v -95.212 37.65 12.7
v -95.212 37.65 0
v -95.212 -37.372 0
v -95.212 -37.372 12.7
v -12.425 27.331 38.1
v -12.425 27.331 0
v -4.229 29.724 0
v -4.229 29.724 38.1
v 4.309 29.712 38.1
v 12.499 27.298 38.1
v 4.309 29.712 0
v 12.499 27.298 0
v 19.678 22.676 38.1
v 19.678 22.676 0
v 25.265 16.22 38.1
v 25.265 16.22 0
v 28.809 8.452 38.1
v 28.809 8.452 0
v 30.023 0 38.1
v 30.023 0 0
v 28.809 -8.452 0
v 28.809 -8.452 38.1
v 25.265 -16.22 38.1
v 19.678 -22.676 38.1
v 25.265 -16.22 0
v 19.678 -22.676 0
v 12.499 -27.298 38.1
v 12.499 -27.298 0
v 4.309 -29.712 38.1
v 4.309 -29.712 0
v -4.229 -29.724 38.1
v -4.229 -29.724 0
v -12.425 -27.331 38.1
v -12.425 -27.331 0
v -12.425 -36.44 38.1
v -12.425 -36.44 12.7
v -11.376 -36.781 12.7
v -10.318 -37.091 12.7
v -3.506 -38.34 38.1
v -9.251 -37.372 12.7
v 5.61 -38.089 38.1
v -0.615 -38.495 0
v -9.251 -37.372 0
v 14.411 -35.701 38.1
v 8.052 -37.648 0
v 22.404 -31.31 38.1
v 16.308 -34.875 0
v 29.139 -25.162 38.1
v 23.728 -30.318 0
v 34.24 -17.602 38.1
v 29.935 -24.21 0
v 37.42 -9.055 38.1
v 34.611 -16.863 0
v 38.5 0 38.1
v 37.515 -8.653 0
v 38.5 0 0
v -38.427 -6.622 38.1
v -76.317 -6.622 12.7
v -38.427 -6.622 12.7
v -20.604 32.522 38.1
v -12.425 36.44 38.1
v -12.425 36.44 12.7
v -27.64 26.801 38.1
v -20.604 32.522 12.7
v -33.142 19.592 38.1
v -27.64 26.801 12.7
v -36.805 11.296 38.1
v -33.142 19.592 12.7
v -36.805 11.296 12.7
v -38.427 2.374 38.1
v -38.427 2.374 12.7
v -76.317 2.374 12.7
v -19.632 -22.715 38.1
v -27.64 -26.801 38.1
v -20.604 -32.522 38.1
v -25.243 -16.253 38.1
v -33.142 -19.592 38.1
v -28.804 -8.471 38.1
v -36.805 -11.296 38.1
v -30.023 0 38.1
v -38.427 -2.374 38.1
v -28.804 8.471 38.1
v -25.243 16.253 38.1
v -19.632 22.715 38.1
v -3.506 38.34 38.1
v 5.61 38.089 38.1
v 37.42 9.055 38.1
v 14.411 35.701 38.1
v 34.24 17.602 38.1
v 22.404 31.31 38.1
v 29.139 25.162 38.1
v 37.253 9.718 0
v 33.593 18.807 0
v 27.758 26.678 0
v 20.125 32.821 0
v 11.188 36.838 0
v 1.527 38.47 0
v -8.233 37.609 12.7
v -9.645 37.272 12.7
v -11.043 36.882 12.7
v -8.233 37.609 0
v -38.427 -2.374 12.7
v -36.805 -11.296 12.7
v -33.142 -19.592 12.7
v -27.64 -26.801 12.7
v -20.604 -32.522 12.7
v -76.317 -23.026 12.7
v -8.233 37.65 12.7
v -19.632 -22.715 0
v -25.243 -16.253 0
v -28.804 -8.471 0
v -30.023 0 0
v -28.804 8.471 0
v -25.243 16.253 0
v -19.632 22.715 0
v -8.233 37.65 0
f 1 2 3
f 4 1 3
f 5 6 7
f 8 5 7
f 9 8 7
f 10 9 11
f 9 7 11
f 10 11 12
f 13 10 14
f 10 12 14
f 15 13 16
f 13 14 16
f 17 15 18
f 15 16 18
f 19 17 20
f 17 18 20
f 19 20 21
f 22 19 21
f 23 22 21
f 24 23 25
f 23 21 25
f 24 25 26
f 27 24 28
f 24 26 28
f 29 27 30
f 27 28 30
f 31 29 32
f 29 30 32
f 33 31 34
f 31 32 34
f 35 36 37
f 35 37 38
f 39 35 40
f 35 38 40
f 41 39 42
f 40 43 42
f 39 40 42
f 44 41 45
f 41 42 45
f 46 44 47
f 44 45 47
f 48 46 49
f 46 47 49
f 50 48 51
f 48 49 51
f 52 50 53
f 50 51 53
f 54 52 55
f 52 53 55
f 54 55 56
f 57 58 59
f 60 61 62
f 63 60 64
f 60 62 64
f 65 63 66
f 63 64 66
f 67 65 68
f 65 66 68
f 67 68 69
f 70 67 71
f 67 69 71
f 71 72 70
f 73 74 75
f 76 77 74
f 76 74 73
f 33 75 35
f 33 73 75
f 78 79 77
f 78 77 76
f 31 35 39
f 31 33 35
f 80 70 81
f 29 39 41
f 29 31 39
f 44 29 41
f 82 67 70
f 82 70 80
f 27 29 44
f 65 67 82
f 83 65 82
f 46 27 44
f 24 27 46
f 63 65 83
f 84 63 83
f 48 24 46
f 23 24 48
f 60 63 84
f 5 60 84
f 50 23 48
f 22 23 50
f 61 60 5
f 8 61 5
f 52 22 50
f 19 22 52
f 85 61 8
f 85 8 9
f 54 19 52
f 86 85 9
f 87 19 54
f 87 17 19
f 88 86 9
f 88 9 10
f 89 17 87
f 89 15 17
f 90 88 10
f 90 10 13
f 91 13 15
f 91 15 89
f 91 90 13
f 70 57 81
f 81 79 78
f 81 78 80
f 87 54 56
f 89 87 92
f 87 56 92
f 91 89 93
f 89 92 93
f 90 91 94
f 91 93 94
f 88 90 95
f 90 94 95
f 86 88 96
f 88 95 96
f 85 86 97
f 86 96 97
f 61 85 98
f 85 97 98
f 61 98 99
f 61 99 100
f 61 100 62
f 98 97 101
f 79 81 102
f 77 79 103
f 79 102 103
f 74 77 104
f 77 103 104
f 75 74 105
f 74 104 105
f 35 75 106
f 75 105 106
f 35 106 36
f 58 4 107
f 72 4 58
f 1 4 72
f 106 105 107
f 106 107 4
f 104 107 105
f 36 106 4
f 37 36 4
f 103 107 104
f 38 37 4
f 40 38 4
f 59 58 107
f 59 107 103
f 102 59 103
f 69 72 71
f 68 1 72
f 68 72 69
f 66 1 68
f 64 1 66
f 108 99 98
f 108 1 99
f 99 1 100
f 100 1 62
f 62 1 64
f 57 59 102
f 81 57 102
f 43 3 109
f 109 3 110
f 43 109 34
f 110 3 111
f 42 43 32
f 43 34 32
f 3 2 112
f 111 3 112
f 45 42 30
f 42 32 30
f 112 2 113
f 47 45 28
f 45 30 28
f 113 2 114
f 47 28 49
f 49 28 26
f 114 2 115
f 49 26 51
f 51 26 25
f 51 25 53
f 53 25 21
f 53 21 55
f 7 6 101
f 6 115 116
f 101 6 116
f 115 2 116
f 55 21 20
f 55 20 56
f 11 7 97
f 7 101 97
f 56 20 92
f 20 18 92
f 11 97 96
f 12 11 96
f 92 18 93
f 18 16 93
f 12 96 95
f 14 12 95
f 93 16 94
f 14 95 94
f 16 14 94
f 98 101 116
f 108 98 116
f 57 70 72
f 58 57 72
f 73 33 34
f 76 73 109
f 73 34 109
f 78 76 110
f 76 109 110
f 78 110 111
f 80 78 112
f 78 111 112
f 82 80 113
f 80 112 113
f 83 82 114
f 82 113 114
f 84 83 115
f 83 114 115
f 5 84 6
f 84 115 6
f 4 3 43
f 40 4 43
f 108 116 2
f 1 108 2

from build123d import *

# Parameters (mm, degrees)
F1_DEPTH = 38.1
F3_DEPTH = 12.7
F4_W     = 37.890759
F4_H     = 8.996059
F5_DEPTH = 25.4
F7_DEPTH = 25.4


with BuildPart() as f1:
    # F0 (on Top) → F1 (new body)
    with BuildSketch(Plane.XY):
        with BuildLine():
            Line((-12.425475, 27.331422), (-12.425475, 36.439589))
            ThreePointArc((-12.425475, 36.439589), (-38.49982, 0), (-12.425475, -36.439589))
            Line((-12.425475, -36.439589), (-12.425475, -27.331422))
            ThreePointArc((-12.425475, -27.331422), (-30.023308, 0), (-12.425475, 27.331422))
        make_face()
        with BuildLine():
            ThreePointArc((-12.425475, -36.439589), (22.403767, -31.30986), (38.49982, 0))
            ThreePointArc((38.49982, 0), (22.403767, 31.30986), (-12.425475, 36.439589))
            Line((-12.425475, 36.439589), (-12.425475, 27.331422))
            ThreePointArc((-12.425475, 27.331422), (16.253387, 25.243345), (30.023308, 0))
            ThreePointArc((30.023308, 0), (16.253387, -25.243345), (-12.425475, -27.331422))
            Line((-12.425475, -27.331422), (-12.425475, -36.439589))
        make_face()
    extrude(amount=F1_DEPTH)

    # F2 (on Top) → F3 (join)
    with BuildSketch(Plane.XY):
        with BuildLine():
            ThreePointArc((-8.232961, -37.371887), (-38.267997, 0), (-8.232961, 37.371887))
            Line((-8.232961, 37.371887), (-8.232961, 37.649773))
            Line((-8.232961, 37.649773), (-95.211737, 37.649773))
            Line((-95.211737, 37.649773), (-95.211737, -37.371887))
            Line((-95.211737, -37.371887), (-8.232961, -37.371887))
        make_face()
    extrude(amount=F3_DEPTH)

    # F4 (on face) → F5 (join)
    with BuildSketch(Plane.XY.offset(12.7)):
        with Locations((-57.37193, -2.123943)):
            Rectangle(F4_W, F4_H)
    extrude(amount=F5_DEPTH)

    # F6 (on face) → F7 (cut)
    with BuildSketch(Plane(origin=(0, 2.374087, 0), x_dir=(-1, 0, 0), z_dir=(0, 1, 0))):
        Polygon((76.31731, 38.1), (38.426551, 38.1), (76.31731, 12.7), align=None)
    extrude(amount=-F7_DEPTH, mode=Mode.SUBTRACT)


solid = f1.part
